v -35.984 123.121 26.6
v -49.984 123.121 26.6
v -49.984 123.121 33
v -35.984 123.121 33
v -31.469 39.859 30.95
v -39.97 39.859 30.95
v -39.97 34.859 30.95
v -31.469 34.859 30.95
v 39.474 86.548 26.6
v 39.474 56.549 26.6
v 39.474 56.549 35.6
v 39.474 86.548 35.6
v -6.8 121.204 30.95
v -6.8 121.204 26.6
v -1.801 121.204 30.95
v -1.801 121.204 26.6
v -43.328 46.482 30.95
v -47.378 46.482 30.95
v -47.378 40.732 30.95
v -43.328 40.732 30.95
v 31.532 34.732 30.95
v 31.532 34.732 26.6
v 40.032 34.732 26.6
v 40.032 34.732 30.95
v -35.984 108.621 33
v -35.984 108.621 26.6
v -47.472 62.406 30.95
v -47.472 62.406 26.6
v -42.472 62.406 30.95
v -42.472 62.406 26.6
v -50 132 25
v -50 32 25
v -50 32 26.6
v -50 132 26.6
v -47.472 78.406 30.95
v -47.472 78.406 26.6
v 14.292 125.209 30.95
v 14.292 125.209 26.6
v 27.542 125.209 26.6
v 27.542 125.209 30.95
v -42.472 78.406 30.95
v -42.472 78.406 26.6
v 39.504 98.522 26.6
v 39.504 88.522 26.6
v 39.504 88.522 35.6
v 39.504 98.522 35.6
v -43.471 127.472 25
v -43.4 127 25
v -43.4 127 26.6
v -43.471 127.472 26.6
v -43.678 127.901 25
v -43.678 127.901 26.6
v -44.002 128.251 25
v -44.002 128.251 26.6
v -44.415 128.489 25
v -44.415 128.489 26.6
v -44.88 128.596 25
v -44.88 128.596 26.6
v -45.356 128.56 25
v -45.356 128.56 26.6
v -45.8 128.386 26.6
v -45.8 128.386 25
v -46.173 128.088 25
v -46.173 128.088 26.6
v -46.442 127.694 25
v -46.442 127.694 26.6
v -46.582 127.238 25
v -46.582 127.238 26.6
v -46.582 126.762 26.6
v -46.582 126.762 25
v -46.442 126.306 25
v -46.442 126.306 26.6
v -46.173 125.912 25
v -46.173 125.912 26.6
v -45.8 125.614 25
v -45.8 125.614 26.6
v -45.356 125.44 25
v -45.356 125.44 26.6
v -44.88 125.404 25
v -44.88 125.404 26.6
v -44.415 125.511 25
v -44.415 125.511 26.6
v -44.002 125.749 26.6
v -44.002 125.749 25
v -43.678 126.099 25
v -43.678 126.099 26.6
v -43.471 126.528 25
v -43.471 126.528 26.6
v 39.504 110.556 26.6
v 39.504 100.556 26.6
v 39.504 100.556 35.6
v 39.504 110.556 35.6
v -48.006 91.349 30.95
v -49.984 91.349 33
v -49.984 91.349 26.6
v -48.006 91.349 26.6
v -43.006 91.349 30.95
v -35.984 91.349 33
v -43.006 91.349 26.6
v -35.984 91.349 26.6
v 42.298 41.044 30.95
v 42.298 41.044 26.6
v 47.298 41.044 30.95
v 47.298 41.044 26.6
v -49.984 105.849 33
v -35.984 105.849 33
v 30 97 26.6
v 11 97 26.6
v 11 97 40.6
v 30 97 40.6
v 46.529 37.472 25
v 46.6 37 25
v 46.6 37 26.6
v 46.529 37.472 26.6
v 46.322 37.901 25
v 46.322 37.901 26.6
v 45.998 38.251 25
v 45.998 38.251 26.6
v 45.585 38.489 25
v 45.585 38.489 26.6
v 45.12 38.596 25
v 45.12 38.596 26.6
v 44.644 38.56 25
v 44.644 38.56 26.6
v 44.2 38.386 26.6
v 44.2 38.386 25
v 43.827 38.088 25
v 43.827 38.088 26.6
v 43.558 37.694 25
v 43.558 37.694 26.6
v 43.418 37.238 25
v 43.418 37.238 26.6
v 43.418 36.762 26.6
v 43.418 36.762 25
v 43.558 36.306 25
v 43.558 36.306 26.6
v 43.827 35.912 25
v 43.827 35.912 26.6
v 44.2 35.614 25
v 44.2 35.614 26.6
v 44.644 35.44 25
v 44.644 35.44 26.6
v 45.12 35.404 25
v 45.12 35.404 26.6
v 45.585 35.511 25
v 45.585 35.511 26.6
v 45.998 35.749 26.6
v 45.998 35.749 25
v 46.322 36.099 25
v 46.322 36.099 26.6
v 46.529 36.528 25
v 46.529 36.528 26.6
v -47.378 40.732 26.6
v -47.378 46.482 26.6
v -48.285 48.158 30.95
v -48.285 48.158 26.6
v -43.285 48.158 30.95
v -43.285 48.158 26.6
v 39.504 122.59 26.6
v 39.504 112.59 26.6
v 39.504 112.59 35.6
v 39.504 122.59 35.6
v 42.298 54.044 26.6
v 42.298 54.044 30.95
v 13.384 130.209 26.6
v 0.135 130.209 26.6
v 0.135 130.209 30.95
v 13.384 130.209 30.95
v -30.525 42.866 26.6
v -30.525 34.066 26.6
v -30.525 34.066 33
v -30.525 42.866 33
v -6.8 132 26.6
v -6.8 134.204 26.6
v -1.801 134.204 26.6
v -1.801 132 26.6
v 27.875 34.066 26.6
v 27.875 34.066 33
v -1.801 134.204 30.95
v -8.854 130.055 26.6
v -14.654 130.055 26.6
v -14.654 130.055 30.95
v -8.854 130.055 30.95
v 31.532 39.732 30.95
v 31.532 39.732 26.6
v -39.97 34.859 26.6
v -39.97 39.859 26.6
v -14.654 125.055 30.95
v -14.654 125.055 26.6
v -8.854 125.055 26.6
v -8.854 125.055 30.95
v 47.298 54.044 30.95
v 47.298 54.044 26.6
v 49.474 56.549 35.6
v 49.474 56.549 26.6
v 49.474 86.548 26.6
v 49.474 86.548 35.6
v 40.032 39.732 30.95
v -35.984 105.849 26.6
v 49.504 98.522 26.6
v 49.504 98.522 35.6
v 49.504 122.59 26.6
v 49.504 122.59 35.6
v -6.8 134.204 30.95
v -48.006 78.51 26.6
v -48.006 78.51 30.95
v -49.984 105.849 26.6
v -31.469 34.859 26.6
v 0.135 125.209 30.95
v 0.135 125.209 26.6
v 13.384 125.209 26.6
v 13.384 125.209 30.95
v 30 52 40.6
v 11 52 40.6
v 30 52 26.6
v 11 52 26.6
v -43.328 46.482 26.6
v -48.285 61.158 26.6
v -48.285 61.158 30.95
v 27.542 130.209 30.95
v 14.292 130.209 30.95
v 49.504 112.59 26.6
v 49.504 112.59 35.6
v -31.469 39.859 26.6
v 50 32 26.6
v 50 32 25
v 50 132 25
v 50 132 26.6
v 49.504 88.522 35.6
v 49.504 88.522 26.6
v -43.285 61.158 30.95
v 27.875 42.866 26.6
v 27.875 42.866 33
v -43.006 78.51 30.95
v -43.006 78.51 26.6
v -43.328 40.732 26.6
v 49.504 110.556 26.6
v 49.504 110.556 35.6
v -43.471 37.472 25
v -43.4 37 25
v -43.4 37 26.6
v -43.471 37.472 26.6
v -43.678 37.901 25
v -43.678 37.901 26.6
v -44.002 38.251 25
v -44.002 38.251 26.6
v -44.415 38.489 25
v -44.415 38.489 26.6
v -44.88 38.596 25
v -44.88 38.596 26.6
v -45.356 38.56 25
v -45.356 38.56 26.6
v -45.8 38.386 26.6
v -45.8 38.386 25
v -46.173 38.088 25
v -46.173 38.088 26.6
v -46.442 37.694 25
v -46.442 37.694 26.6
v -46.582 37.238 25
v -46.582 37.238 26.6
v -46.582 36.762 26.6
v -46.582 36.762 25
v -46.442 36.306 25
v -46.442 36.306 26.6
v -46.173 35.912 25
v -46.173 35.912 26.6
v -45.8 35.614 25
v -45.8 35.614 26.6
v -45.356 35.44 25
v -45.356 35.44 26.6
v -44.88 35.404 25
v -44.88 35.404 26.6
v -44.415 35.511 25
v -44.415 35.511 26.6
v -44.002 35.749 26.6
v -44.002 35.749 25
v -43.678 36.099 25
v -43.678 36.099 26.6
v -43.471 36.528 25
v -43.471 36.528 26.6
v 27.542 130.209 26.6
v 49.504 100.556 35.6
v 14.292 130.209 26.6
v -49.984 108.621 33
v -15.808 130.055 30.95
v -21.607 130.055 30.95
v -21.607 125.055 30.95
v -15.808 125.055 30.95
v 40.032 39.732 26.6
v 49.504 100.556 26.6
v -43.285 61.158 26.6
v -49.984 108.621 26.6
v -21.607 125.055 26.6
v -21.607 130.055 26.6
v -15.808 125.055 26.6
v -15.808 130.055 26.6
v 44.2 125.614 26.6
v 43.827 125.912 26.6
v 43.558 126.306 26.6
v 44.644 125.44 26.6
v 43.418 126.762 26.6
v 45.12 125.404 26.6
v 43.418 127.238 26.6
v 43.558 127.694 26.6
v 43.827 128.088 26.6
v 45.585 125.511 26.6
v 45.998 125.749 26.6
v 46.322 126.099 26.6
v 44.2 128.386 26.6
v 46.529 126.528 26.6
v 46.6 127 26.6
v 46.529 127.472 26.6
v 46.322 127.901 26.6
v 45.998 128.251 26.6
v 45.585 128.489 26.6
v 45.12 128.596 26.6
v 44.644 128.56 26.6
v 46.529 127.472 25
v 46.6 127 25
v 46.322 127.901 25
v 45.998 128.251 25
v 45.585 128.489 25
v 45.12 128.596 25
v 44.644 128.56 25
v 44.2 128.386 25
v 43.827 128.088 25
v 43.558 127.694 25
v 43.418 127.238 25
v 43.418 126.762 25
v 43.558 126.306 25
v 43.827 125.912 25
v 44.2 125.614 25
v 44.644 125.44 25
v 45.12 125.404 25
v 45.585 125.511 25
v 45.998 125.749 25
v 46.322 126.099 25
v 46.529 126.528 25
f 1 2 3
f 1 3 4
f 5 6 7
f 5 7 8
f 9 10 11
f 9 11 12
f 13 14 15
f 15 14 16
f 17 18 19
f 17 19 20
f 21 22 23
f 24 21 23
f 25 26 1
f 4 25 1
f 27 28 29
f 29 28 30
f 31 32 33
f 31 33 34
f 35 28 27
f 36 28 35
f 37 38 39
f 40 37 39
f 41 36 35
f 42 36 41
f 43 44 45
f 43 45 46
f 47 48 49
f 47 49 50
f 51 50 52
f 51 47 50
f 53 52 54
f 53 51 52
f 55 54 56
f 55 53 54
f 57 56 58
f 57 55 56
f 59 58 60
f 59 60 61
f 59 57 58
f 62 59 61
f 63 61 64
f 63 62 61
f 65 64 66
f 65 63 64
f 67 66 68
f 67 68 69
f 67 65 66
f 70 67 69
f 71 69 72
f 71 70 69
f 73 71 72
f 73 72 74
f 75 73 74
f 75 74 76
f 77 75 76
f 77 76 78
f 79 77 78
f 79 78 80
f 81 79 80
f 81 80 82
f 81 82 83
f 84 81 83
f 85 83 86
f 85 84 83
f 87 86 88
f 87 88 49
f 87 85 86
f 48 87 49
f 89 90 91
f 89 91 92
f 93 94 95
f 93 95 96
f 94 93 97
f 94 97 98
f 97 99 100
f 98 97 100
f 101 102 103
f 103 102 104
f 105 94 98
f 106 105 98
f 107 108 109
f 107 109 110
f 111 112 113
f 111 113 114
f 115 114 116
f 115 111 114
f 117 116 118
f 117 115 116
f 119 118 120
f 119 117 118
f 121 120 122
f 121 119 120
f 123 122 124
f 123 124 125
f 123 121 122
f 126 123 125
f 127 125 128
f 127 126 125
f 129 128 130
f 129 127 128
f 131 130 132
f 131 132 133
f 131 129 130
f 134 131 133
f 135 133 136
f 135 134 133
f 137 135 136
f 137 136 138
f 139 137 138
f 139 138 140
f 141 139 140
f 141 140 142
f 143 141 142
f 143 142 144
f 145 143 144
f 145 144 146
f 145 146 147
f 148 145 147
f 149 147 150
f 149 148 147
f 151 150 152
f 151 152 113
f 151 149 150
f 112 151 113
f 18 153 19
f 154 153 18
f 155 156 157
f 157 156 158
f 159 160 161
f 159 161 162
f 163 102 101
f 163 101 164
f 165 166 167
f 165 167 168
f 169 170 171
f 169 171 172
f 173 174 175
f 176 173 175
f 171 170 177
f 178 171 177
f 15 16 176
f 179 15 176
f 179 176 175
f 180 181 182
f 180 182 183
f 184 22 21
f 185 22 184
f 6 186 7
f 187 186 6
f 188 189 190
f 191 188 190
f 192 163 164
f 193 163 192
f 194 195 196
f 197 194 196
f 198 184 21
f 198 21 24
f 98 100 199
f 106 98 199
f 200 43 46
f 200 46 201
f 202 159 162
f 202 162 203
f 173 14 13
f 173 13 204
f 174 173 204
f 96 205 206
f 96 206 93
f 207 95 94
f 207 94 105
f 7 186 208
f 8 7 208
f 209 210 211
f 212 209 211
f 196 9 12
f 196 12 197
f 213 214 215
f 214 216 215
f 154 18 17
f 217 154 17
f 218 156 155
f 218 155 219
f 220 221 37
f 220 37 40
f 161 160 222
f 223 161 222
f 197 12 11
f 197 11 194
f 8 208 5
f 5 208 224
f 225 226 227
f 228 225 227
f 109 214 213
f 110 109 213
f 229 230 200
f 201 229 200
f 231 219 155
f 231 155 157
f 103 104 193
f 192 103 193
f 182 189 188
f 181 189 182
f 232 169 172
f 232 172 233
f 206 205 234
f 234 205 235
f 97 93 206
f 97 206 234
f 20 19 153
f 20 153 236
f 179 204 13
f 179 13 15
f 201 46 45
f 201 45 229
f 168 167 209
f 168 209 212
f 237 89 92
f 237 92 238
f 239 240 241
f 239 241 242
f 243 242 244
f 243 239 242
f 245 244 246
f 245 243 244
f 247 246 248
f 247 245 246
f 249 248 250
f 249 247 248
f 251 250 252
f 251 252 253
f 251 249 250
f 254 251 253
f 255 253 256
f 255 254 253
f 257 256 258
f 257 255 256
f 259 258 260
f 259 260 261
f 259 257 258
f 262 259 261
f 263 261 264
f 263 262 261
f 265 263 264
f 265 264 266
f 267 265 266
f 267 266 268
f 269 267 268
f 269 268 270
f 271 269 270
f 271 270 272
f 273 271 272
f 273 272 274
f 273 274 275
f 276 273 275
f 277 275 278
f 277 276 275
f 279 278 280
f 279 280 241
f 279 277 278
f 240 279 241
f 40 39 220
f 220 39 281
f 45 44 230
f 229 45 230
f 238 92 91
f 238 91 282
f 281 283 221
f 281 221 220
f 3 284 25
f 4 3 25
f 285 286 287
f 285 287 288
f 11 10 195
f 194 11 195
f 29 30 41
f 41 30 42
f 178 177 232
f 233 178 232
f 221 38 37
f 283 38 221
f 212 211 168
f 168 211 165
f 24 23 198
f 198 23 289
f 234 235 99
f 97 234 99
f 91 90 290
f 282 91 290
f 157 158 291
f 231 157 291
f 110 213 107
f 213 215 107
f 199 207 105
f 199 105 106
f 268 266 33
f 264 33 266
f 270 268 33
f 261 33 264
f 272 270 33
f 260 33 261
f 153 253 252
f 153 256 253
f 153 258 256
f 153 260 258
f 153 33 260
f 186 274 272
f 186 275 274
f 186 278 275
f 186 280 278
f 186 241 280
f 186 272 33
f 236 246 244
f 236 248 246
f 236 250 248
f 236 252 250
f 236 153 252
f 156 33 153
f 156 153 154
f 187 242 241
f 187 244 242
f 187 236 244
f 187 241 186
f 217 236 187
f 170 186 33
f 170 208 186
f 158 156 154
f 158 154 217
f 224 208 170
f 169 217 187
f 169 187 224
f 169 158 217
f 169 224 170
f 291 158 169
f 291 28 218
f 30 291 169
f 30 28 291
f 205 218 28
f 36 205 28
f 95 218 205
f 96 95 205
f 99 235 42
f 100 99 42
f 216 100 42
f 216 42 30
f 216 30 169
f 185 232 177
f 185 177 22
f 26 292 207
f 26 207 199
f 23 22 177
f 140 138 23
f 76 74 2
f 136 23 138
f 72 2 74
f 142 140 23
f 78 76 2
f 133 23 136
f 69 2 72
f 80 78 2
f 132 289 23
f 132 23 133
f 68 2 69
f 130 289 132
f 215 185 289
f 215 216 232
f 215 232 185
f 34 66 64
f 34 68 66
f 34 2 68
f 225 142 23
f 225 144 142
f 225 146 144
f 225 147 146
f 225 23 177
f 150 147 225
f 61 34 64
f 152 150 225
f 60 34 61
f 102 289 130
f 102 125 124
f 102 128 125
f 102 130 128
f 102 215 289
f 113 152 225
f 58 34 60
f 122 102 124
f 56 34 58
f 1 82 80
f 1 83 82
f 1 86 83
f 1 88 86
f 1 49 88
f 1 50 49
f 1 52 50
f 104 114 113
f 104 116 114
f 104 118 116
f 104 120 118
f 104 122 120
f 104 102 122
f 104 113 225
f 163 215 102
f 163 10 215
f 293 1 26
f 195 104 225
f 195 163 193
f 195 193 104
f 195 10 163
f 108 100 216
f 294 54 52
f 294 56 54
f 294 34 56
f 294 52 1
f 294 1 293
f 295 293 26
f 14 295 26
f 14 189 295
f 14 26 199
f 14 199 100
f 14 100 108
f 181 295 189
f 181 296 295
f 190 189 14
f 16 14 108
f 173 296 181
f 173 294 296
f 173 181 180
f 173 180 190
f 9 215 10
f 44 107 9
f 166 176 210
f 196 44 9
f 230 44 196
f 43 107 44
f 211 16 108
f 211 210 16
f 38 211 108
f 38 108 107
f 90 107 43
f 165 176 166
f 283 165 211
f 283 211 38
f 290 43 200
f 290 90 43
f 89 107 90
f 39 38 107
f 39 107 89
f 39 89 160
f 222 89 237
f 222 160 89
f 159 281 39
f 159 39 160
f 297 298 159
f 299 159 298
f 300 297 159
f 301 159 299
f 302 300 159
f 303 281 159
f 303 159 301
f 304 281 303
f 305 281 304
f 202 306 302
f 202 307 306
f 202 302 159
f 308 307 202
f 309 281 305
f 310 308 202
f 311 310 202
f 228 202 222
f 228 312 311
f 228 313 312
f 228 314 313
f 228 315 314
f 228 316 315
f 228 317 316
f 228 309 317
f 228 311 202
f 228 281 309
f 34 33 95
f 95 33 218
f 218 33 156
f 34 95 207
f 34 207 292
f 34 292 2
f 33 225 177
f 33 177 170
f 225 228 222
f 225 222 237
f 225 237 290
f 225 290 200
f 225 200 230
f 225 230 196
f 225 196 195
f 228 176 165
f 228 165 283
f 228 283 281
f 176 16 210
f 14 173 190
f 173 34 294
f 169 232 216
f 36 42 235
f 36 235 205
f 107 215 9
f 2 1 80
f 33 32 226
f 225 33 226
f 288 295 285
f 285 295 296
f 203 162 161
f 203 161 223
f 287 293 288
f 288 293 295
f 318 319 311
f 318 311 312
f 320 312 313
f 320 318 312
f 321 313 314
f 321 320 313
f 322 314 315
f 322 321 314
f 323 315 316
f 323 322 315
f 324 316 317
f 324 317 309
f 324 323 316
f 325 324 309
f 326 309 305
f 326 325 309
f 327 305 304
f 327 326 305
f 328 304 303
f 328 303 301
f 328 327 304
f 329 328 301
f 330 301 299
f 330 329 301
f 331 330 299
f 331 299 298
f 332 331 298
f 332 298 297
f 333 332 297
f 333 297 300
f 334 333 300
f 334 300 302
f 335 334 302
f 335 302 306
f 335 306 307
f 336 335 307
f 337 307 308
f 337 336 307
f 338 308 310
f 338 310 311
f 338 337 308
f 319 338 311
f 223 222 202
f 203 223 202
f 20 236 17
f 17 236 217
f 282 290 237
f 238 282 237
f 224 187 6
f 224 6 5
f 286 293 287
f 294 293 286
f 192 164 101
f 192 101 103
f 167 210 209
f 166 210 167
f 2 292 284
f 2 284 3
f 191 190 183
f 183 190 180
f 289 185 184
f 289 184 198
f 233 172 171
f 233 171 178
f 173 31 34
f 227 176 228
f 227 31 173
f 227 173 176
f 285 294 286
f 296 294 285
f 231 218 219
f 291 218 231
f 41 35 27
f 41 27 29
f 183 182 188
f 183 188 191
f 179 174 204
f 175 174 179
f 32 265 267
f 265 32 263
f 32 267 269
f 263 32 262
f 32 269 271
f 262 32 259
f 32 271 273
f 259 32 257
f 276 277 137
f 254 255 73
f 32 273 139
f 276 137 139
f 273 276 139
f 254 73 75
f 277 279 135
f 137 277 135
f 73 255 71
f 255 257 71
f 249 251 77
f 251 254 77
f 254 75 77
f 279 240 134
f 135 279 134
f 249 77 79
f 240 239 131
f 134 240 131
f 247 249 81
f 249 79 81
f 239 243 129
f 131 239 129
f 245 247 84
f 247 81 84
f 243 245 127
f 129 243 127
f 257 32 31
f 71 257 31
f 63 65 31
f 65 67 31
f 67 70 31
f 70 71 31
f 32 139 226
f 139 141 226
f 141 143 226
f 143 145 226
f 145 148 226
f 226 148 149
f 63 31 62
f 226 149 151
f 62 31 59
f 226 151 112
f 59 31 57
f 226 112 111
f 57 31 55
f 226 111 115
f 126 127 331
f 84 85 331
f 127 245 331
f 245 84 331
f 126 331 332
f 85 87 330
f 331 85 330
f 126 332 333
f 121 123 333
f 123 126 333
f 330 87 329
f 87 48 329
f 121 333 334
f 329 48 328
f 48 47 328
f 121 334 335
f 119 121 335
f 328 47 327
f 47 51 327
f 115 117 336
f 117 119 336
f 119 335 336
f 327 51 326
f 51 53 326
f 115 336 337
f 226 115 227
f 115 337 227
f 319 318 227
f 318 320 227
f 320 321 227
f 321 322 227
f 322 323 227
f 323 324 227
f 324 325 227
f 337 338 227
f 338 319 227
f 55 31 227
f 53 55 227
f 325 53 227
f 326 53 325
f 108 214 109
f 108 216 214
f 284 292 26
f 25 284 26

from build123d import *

# Parameters (mm, degrees)
F_100X100_ROTATED_J101_REAR_J801_FRONT_START = 25
SKETCH_1_W                                   = 100
SKETCH_1_H                                   = 100
SKETCH_1_R                                   = 1.6
F_100X100_ROTATED_J101_REAR_J801_FRONT_DEPTH = 1.6
J102_CONNECTOR_ENVELOPE_ROTATED_START        = 26.6
SKETCH_2_W                                   = 10
SKETCH_2_H                                   = 10
J102_CONNECTOR_ENVELOPE_ROTATED_DEPTH        = 9
J201_CONNECTOR_ENVELOPE_ROTATED_START        = 26.6
SKETCH_3_W                                   = 14
SKETCH_3_H                                   = 14.5
J201_CONNECTOR_ENVELOPE_ROTATED_DEPTH        = 6.4
J501_CONNECTOR_ENVELOPE_ROTATED_START        = 26.6
SKETCH_4_W                                   = 14
SKETCH_4_H                                   = 14.5
J501_CONNECTOR_ENVELOPE_ROTATED_DEPTH        = 6.4
J301_CONNECTOR_ENVELOPE_ROTATED_START        = 26.6
SKETCH_5_W                                   = 10
SKETCH_5_H                                   = 10
J301_CONNECTOR_ENVELOPE_ROTATED_DEPTH        = 9
J304_CONNECTOR_ENVELOPE_ROTATED_START        = 26.6
SKETCH_6_W                                   = 10
SKETCH_6_H                                   = 10
J304_CONNECTOR_ENVELOPE_ROTATED_DEPTH        = 9
J302_CONNECTOR_ENVELOPE_ROTATED_START        = 26.6
SKETCH_7_W                                   = 10
SKETCH_7_H                                   = 30
J302_CONNECTOR_ENVELOPE_ROTATED_DEPTH        = 9
J305_CONNECTOR_ENVELOPE_ROTATED_START        = 26.6
SKETCH_8_W                                   = 5.8
SKETCH_8_H                                   = 5
J305_CONNECTOR_ENVELOPE_ROTATED_DEPTH        = 4.35
J306_CONNECTOR_ENVELOPE_ROTATED_START        = 26.6
SKETCH_9_W                                   = 5.8
SKETCH_9_H                                   = 5
J306_CONNECTOR_ENVELOPE_ROTATED_DEPTH        = 4.35
J401_CONNECTOR_ENVELOPE_ROTATED_START        = 26.6
SKETCH_10_W                                  = 5
SKETCH_10_H                                  = 13
J401_CONNECTOR_ENVELOPE_ROTATED_DEPTH        = 4.35
J502_CONNECTOR_ENVELOPE_ROTATED_START        = 26.6
SKETCH_11_W                                  = 5
SKETCH_11_H                                  = 16
J502_CONNECTOR_ENVELOPE_ROTATED_DEPTH        = 4.35
J602_CONNECTOR_ENVELOPE_ROTATED_START        = 26.6
SKETCH_13_W                                  = 5
SKETCH_13_H                                  = 13
J602_CONNECTOR_ENVELOPE_ROTATED_DEPTH        = 4.35
J701_CONNECTOR_ENVELOPE_ROTATED_START        = 26.6
SKETCH_14_W                                  = 5
SKETCH_14_H                                  = 13
J701_CONNECTOR_ENVELOPE_ROTATED_DEPTH        = 4.35
J702_CONNECTOR_ENVELOPE_ROTATED_START        = 26.6
SKETCH_15_W                                  = 13.25
SKETCH_15_H                                  = 5
J702_CONNECTOR_ENVELOPE_ROTATED_DEPTH        = 4.35
J703_CONNECTOR_ENVELOPE_ROTATED_START        = 26.6
SKETCH_16_W                                  = 13.25
SKETCH_16_H                                  = 5
J703_CONNECTOR_ENVELOPE_ROTATED_DEPTH        = 4.35
J704_CONNECTOR_ENVELOPE_ROTATED_START        = 26.6
SKETCH_17_W                                  = 8.5
SKETCH_17_H                                  = 5
J704_CONNECTOR_ENVELOPE_ROTATED_DEPTH        = 4.35
J705_CONNECTOR_ENVELOPE_ROTATED_START        = 26.6
SKETCH_18_W                                  = 5
SKETCH_18_H                                  = 13
J705_CONNECTOR_ENVELOPE_ROTATED_DEPTH        = 4.35
J706_CONNECTOR_ENVELOPE_ROTATED_START        = 26.6
SKETCH_19_W                                  = 8.5
SKETCH_19_H                                  = 5
J706_CONNECTOR_ENVELOPE_ROTATED_DEPTH        = 4.35
J801_CONNECTOR_ENVELOPE_ROTATED_START        = 26.6
SKETCH_20_W                                  = 58.4
SKETCH_20_H                                  = 8.8
J801_CONNECTOR_ENVELOPE_ROTATED_DEPTH        = 6.4
NANO_SOCKET_START                            = 26.6
SKETCH_21_W                                  = 19
SKETCH_21_H                                  = 45
NANO_SOCKET_DEPTH                            = 12.4
NANO_PCB_START                               = 39
SKETCH_22_W                                  = 19
SKETCH_22_H                                  = 45
NANO_PCB_DEPTH                               = 1.6
J601_GH2P_CORRECTED_BODY_REFERENCE_START     = 26.6
SKETCH_23_W                                  = 4.05
SKETCH_23_H                                  = 5.75
J601_GH2P_CORRECTED_BODY_REFERENCE_DEPTH     = 4.35


with BuildPart() as part:
    # 草图1 → 100x100_rotated_J101_rear_J801_front (new body)
    with BuildSketch(Plane.XY.offset(F_100X100_ROTATED_J101_REAR_J801_FRONT_START)):
        with Locations((0, 82)):
            Rectangle(SKETCH_1_W, SKETCH_1_H)
        with Locations((-45, 37)):
            Circle(SKETCH_1_R, mode=Mode.SUBTRACT)
        with Locations((45, 37)):
            Circle(SKETCH_1_R, mode=Mode.SUBTRACT)
        with Locations((45, 127)):
            Circle(SKETCH_1_R, mode=Mode.SUBTRACT)
        with Locations((-45, 127)):
            Circle(SKETCH_1_R, mode=Mode.SUBTRACT)
    extrude(amount=F_100X100_ROTATED_J101_REAR_J801_FRONT_DEPTH)

    # 草图2 → J102_connector_envelope_rotated (add)
    with BuildSketch(Plane.XY.offset(J102_CONNECTOR_ENVELOPE_ROTATED_START)):
        with Locations((44.5045, 117.5895)):
            Rectangle(SKETCH_2_W, SKETCH_2_H)
    extrude(amount=J102_CONNECTOR_ENVELOPE_ROTATED_DEPTH)

    # 草图3 → J201_connector_envelope_rotated (add)
    with BuildSketch(Plane.XY.offset(J201_CONNECTOR_ENVELOPE_ROTATED_START)):
        with Locations((-42.9835, 115.871)):
            Rectangle(SKETCH_3_W, SKETCH_3_H)
    extrude(amount=J201_CONNECTOR_ENVELOPE_ROTATED_DEPTH)

    # 草图4 → J501_connector_envelope_rotated (add)
    with BuildSketch(Plane.XY.offset(J501_CONNECTOR_ENVELOPE_ROTATED_START)):
        with Locations((-42.9835, 98.599)):
            Rectangle(SKETCH_4_W, SKETCH_4_H)
    extrude(amount=J501_CONNECTOR_ENVELOPE_ROTATED_DEPTH)

    # 草图5 → J301_connector_envelope_rotated (add)
    with BuildSketch(Plane.XY.offset(J301_CONNECTOR_ENVELOPE_ROTATED_START)):
        with Locations((44.5045, 93.5225)):
            Rectangle(SKETCH_5_W, SKETCH_5_H)
    extrude(amount=J301_CONNECTOR_ENVELOPE_ROTATED_DEPTH)

    # 草图6 → J304_connector_envelope_rotated (add)
    with BuildSketch(Plane.XY.offset(J304_CONNECTOR_ENVELOPE_ROTATED_START)):
        with Locations((44.5045, 105.5555)):
            Rectangle(SKETCH_6_W, SKETCH_6_H)
    extrude(amount=J304_CONNECTOR_ENVELOPE_ROTATED_DEPTH)

    # 草图7 → J302_connector_envelope_rotated (add)
    with BuildSketch(Plane.XY.offset(J302_CONNECTOR_ENVELOPE_ROTATED_START)):
        with Locations((44.4745, 71.5485)):
            Rectangle(SKETCH_7_W, SKETCH_7_H)
    extrude(amount=J302_CONNECTOR_ENVELOPE_ROTATED_DEPTH)

    # 草图8 → J305_connector_envelope_rotated (add)
    with BuildSketch(Plane.XY.offset(J305_CONNECTOR_ENVELOPE_ROTATED_START)):
        with Locations((-18.7075, 127.555)):
            Rectangle(SKETCH_8_W, SKETCH_8_H)
    extrude(amount=J305_CONNECTOR_ENVELOPE_ROTATED_DEPTH)

    # 草图9 → J306_connector_envelope_rotated (add)
    with BuildSketch(Plane.XY.offset(J306_CONNECTOR_ENVELOPE_ROTATED_START)):
        with Locations((-11.7545, 127.555)):
            Rectangle(SKETCH_9_W, SKETCH_9_H)
    extrude(amount=J306_CONNECTOR_ENVELOPE_ROTATED_DEPTH)

    # 草图10 → J401_connector_envelope_rotated (add)
    with BuildSketch(Plane.XY.offset(J401_CONNECTOR_ENVELOPE_ROTATED_START)):
        with Locations((44.7985, 47.5445)):
            Rectangle(SKETCH_10_W, SKETCH_10_H)
    extrude(amount=J401_CONNECTOR_ENVELOPE_ROTATED_DEPTH)

    # 草图11 → J502_connector_envelope_rotated (add)
    with BuildSketch(Plane.XY.offset(J502_CONNECTOR_ENVELOPE_ROTATED_START)):
        with Locations((-44.972, 70.4055)):
            Rectangle(SKETCH_11_W, SKETCH_11_H)
    extrude(amount=J502_CONNECTOR_ENVELOPE_ROTATED_DEPTH)

    # 草图13 → J602_connector_envelope_rotated (add)
    with BuildSketch(Plane.XY.offset(J602_CONNECTOR_ENVELOPE_ROTATED_START)):
        with Locations((-45.785, 54.6575)):
            Rectangle(SKETCH_13_W, SKETCH_13_H)
    extrude(amount=J602_CONNECTOR_ENVELOPE_ROTATED_DEPTH)

    # 草图14 → J701_connector_envelope_rotated (add)
    with BuildSketch(Plane.XY.offset(J701_CONNECTOR_ENVELOPE_ROTATED_START)):
        with Locations((-45.506, 85.0105)):
            Rectangle(SKETCH_14_W, SKETCH_14_H)
    extrude(amount=J701_CONNECTOR_ENVELOPE_ROTATED_DEPTH)

    # 草图15 → J702_connector_envelope_rotated (add)
    with BuildSketch(Plane.XY.offset(J702_CONNECTOR_ENVELOPE_ROTATED_START)):
        with Locations((6.7595, 127.709)):
            Rectangle(SKETCH_15_W, SKETCH_15_H)
    extrude(amount=J702_CONNECTOR_ENVELOPE_ROTATED_DEPTH)

    # 草图16 → J703_connector_envelope_rotated (add)
    with BuildSketch(Plane.XY.offset(J703_CONNECTOR_ENVELOPE_ROTATED_START)):
        with Locations((20.9175, 127.709)):
            Rectangle(SKETCH_16_W, SKETCH_16_H)
    extrude(amount=J703_CONNECTOR_ENVELOPE_ROTATED_DEPTH)

    # 草图17 → J704_connector_envelope_rotated (add)
    with BuildSketch(Plane.XY.offset(J704_CONNECTOR_ENVELOPE_ROTATED_START)):
        with Locations((-35.7195, 37.359)):
            Rectangle(SKETCH_17_W, SKETCH_17_H)
    extrude(amount=J704_CONNECTOR_ENVELOPE_ROTATED_DEPTH)

    # 草图18 → J705_connector_envelope_rotated (add)
    with BuildSketch(Plane.XY.offset(J705_CONNECTOR_ENVELOPE_ROTATED_START)):
        with Locations((-4.3005, 127.704)):
            Rectangle(SKETCH_18_W, SKETCH_18_H)
    extrude(amount=J705_CONNECTOR_ENVELOPE_ROTATED_DEPTH)

    # 草图19 → J706_connector_envelope_rotated (add)
    with BuildSketch(Plane.XY.offset(J706_CONNECTOR_ENVELOPE_ROTATED_START)):
        with Locations((35.7815, 37.232)):
            Rectangle(SKETCH_19_W, SKETCH_19_H)
    extrude(amount=J706_CONNECTOR_ENVELOPE_ROTATED_DEPTH)

    # 草图20 → J801_connector_envelope_rotated (add)
    with BuildSketch(Plane.XY.offset(J801_CONNECTOR_ENVELOPE_ROTATED_START)):
        with Locations((-1.325, 38.466)):
            Rectangle(SKETCH_20_W, SKETCH_20_H)
    extrude(amount=J801_CONNECTOR_ENVELOPE_ROTATED_DEPTH)

    # 草图21 → Nano_socket (add)
    with BuildSketch(Plane.XY.offset(NANO_SOCKET_START)):
        with Locations((20.5, 74.5)):
            Rectangle(SKETCH_21_W, SKETCH_21_H)
    extrude(amount=NANO_SOCKET_DEPTH)

    # 草图22 → Nano_PCB (add)
    with BuildSketch(Plane.XY.offset(NANO_PCB_START)):
        with Locations((20.5, 74.5)):
            Rectangle(SKETCH_22_W, SKETCH_22_H)
    extrude(amount=NANO_PCB_DEPTH)

    # 草图23 → J601_GH2P_corrected_body_reference (add)
    with BuildSketch(Plane.XY.offset(J601_GH2P_CORRECTED_BODY_REFERENCE_START)):
        with Locations((-45.353, 43.6075)):
            Rectangle(SKETCH_23_W, SKETCH_23_H)
    extrude(amount=J601_GH2P_CORRECTED_BODY_REFERENCE_DEPTH)


solid = part.part
